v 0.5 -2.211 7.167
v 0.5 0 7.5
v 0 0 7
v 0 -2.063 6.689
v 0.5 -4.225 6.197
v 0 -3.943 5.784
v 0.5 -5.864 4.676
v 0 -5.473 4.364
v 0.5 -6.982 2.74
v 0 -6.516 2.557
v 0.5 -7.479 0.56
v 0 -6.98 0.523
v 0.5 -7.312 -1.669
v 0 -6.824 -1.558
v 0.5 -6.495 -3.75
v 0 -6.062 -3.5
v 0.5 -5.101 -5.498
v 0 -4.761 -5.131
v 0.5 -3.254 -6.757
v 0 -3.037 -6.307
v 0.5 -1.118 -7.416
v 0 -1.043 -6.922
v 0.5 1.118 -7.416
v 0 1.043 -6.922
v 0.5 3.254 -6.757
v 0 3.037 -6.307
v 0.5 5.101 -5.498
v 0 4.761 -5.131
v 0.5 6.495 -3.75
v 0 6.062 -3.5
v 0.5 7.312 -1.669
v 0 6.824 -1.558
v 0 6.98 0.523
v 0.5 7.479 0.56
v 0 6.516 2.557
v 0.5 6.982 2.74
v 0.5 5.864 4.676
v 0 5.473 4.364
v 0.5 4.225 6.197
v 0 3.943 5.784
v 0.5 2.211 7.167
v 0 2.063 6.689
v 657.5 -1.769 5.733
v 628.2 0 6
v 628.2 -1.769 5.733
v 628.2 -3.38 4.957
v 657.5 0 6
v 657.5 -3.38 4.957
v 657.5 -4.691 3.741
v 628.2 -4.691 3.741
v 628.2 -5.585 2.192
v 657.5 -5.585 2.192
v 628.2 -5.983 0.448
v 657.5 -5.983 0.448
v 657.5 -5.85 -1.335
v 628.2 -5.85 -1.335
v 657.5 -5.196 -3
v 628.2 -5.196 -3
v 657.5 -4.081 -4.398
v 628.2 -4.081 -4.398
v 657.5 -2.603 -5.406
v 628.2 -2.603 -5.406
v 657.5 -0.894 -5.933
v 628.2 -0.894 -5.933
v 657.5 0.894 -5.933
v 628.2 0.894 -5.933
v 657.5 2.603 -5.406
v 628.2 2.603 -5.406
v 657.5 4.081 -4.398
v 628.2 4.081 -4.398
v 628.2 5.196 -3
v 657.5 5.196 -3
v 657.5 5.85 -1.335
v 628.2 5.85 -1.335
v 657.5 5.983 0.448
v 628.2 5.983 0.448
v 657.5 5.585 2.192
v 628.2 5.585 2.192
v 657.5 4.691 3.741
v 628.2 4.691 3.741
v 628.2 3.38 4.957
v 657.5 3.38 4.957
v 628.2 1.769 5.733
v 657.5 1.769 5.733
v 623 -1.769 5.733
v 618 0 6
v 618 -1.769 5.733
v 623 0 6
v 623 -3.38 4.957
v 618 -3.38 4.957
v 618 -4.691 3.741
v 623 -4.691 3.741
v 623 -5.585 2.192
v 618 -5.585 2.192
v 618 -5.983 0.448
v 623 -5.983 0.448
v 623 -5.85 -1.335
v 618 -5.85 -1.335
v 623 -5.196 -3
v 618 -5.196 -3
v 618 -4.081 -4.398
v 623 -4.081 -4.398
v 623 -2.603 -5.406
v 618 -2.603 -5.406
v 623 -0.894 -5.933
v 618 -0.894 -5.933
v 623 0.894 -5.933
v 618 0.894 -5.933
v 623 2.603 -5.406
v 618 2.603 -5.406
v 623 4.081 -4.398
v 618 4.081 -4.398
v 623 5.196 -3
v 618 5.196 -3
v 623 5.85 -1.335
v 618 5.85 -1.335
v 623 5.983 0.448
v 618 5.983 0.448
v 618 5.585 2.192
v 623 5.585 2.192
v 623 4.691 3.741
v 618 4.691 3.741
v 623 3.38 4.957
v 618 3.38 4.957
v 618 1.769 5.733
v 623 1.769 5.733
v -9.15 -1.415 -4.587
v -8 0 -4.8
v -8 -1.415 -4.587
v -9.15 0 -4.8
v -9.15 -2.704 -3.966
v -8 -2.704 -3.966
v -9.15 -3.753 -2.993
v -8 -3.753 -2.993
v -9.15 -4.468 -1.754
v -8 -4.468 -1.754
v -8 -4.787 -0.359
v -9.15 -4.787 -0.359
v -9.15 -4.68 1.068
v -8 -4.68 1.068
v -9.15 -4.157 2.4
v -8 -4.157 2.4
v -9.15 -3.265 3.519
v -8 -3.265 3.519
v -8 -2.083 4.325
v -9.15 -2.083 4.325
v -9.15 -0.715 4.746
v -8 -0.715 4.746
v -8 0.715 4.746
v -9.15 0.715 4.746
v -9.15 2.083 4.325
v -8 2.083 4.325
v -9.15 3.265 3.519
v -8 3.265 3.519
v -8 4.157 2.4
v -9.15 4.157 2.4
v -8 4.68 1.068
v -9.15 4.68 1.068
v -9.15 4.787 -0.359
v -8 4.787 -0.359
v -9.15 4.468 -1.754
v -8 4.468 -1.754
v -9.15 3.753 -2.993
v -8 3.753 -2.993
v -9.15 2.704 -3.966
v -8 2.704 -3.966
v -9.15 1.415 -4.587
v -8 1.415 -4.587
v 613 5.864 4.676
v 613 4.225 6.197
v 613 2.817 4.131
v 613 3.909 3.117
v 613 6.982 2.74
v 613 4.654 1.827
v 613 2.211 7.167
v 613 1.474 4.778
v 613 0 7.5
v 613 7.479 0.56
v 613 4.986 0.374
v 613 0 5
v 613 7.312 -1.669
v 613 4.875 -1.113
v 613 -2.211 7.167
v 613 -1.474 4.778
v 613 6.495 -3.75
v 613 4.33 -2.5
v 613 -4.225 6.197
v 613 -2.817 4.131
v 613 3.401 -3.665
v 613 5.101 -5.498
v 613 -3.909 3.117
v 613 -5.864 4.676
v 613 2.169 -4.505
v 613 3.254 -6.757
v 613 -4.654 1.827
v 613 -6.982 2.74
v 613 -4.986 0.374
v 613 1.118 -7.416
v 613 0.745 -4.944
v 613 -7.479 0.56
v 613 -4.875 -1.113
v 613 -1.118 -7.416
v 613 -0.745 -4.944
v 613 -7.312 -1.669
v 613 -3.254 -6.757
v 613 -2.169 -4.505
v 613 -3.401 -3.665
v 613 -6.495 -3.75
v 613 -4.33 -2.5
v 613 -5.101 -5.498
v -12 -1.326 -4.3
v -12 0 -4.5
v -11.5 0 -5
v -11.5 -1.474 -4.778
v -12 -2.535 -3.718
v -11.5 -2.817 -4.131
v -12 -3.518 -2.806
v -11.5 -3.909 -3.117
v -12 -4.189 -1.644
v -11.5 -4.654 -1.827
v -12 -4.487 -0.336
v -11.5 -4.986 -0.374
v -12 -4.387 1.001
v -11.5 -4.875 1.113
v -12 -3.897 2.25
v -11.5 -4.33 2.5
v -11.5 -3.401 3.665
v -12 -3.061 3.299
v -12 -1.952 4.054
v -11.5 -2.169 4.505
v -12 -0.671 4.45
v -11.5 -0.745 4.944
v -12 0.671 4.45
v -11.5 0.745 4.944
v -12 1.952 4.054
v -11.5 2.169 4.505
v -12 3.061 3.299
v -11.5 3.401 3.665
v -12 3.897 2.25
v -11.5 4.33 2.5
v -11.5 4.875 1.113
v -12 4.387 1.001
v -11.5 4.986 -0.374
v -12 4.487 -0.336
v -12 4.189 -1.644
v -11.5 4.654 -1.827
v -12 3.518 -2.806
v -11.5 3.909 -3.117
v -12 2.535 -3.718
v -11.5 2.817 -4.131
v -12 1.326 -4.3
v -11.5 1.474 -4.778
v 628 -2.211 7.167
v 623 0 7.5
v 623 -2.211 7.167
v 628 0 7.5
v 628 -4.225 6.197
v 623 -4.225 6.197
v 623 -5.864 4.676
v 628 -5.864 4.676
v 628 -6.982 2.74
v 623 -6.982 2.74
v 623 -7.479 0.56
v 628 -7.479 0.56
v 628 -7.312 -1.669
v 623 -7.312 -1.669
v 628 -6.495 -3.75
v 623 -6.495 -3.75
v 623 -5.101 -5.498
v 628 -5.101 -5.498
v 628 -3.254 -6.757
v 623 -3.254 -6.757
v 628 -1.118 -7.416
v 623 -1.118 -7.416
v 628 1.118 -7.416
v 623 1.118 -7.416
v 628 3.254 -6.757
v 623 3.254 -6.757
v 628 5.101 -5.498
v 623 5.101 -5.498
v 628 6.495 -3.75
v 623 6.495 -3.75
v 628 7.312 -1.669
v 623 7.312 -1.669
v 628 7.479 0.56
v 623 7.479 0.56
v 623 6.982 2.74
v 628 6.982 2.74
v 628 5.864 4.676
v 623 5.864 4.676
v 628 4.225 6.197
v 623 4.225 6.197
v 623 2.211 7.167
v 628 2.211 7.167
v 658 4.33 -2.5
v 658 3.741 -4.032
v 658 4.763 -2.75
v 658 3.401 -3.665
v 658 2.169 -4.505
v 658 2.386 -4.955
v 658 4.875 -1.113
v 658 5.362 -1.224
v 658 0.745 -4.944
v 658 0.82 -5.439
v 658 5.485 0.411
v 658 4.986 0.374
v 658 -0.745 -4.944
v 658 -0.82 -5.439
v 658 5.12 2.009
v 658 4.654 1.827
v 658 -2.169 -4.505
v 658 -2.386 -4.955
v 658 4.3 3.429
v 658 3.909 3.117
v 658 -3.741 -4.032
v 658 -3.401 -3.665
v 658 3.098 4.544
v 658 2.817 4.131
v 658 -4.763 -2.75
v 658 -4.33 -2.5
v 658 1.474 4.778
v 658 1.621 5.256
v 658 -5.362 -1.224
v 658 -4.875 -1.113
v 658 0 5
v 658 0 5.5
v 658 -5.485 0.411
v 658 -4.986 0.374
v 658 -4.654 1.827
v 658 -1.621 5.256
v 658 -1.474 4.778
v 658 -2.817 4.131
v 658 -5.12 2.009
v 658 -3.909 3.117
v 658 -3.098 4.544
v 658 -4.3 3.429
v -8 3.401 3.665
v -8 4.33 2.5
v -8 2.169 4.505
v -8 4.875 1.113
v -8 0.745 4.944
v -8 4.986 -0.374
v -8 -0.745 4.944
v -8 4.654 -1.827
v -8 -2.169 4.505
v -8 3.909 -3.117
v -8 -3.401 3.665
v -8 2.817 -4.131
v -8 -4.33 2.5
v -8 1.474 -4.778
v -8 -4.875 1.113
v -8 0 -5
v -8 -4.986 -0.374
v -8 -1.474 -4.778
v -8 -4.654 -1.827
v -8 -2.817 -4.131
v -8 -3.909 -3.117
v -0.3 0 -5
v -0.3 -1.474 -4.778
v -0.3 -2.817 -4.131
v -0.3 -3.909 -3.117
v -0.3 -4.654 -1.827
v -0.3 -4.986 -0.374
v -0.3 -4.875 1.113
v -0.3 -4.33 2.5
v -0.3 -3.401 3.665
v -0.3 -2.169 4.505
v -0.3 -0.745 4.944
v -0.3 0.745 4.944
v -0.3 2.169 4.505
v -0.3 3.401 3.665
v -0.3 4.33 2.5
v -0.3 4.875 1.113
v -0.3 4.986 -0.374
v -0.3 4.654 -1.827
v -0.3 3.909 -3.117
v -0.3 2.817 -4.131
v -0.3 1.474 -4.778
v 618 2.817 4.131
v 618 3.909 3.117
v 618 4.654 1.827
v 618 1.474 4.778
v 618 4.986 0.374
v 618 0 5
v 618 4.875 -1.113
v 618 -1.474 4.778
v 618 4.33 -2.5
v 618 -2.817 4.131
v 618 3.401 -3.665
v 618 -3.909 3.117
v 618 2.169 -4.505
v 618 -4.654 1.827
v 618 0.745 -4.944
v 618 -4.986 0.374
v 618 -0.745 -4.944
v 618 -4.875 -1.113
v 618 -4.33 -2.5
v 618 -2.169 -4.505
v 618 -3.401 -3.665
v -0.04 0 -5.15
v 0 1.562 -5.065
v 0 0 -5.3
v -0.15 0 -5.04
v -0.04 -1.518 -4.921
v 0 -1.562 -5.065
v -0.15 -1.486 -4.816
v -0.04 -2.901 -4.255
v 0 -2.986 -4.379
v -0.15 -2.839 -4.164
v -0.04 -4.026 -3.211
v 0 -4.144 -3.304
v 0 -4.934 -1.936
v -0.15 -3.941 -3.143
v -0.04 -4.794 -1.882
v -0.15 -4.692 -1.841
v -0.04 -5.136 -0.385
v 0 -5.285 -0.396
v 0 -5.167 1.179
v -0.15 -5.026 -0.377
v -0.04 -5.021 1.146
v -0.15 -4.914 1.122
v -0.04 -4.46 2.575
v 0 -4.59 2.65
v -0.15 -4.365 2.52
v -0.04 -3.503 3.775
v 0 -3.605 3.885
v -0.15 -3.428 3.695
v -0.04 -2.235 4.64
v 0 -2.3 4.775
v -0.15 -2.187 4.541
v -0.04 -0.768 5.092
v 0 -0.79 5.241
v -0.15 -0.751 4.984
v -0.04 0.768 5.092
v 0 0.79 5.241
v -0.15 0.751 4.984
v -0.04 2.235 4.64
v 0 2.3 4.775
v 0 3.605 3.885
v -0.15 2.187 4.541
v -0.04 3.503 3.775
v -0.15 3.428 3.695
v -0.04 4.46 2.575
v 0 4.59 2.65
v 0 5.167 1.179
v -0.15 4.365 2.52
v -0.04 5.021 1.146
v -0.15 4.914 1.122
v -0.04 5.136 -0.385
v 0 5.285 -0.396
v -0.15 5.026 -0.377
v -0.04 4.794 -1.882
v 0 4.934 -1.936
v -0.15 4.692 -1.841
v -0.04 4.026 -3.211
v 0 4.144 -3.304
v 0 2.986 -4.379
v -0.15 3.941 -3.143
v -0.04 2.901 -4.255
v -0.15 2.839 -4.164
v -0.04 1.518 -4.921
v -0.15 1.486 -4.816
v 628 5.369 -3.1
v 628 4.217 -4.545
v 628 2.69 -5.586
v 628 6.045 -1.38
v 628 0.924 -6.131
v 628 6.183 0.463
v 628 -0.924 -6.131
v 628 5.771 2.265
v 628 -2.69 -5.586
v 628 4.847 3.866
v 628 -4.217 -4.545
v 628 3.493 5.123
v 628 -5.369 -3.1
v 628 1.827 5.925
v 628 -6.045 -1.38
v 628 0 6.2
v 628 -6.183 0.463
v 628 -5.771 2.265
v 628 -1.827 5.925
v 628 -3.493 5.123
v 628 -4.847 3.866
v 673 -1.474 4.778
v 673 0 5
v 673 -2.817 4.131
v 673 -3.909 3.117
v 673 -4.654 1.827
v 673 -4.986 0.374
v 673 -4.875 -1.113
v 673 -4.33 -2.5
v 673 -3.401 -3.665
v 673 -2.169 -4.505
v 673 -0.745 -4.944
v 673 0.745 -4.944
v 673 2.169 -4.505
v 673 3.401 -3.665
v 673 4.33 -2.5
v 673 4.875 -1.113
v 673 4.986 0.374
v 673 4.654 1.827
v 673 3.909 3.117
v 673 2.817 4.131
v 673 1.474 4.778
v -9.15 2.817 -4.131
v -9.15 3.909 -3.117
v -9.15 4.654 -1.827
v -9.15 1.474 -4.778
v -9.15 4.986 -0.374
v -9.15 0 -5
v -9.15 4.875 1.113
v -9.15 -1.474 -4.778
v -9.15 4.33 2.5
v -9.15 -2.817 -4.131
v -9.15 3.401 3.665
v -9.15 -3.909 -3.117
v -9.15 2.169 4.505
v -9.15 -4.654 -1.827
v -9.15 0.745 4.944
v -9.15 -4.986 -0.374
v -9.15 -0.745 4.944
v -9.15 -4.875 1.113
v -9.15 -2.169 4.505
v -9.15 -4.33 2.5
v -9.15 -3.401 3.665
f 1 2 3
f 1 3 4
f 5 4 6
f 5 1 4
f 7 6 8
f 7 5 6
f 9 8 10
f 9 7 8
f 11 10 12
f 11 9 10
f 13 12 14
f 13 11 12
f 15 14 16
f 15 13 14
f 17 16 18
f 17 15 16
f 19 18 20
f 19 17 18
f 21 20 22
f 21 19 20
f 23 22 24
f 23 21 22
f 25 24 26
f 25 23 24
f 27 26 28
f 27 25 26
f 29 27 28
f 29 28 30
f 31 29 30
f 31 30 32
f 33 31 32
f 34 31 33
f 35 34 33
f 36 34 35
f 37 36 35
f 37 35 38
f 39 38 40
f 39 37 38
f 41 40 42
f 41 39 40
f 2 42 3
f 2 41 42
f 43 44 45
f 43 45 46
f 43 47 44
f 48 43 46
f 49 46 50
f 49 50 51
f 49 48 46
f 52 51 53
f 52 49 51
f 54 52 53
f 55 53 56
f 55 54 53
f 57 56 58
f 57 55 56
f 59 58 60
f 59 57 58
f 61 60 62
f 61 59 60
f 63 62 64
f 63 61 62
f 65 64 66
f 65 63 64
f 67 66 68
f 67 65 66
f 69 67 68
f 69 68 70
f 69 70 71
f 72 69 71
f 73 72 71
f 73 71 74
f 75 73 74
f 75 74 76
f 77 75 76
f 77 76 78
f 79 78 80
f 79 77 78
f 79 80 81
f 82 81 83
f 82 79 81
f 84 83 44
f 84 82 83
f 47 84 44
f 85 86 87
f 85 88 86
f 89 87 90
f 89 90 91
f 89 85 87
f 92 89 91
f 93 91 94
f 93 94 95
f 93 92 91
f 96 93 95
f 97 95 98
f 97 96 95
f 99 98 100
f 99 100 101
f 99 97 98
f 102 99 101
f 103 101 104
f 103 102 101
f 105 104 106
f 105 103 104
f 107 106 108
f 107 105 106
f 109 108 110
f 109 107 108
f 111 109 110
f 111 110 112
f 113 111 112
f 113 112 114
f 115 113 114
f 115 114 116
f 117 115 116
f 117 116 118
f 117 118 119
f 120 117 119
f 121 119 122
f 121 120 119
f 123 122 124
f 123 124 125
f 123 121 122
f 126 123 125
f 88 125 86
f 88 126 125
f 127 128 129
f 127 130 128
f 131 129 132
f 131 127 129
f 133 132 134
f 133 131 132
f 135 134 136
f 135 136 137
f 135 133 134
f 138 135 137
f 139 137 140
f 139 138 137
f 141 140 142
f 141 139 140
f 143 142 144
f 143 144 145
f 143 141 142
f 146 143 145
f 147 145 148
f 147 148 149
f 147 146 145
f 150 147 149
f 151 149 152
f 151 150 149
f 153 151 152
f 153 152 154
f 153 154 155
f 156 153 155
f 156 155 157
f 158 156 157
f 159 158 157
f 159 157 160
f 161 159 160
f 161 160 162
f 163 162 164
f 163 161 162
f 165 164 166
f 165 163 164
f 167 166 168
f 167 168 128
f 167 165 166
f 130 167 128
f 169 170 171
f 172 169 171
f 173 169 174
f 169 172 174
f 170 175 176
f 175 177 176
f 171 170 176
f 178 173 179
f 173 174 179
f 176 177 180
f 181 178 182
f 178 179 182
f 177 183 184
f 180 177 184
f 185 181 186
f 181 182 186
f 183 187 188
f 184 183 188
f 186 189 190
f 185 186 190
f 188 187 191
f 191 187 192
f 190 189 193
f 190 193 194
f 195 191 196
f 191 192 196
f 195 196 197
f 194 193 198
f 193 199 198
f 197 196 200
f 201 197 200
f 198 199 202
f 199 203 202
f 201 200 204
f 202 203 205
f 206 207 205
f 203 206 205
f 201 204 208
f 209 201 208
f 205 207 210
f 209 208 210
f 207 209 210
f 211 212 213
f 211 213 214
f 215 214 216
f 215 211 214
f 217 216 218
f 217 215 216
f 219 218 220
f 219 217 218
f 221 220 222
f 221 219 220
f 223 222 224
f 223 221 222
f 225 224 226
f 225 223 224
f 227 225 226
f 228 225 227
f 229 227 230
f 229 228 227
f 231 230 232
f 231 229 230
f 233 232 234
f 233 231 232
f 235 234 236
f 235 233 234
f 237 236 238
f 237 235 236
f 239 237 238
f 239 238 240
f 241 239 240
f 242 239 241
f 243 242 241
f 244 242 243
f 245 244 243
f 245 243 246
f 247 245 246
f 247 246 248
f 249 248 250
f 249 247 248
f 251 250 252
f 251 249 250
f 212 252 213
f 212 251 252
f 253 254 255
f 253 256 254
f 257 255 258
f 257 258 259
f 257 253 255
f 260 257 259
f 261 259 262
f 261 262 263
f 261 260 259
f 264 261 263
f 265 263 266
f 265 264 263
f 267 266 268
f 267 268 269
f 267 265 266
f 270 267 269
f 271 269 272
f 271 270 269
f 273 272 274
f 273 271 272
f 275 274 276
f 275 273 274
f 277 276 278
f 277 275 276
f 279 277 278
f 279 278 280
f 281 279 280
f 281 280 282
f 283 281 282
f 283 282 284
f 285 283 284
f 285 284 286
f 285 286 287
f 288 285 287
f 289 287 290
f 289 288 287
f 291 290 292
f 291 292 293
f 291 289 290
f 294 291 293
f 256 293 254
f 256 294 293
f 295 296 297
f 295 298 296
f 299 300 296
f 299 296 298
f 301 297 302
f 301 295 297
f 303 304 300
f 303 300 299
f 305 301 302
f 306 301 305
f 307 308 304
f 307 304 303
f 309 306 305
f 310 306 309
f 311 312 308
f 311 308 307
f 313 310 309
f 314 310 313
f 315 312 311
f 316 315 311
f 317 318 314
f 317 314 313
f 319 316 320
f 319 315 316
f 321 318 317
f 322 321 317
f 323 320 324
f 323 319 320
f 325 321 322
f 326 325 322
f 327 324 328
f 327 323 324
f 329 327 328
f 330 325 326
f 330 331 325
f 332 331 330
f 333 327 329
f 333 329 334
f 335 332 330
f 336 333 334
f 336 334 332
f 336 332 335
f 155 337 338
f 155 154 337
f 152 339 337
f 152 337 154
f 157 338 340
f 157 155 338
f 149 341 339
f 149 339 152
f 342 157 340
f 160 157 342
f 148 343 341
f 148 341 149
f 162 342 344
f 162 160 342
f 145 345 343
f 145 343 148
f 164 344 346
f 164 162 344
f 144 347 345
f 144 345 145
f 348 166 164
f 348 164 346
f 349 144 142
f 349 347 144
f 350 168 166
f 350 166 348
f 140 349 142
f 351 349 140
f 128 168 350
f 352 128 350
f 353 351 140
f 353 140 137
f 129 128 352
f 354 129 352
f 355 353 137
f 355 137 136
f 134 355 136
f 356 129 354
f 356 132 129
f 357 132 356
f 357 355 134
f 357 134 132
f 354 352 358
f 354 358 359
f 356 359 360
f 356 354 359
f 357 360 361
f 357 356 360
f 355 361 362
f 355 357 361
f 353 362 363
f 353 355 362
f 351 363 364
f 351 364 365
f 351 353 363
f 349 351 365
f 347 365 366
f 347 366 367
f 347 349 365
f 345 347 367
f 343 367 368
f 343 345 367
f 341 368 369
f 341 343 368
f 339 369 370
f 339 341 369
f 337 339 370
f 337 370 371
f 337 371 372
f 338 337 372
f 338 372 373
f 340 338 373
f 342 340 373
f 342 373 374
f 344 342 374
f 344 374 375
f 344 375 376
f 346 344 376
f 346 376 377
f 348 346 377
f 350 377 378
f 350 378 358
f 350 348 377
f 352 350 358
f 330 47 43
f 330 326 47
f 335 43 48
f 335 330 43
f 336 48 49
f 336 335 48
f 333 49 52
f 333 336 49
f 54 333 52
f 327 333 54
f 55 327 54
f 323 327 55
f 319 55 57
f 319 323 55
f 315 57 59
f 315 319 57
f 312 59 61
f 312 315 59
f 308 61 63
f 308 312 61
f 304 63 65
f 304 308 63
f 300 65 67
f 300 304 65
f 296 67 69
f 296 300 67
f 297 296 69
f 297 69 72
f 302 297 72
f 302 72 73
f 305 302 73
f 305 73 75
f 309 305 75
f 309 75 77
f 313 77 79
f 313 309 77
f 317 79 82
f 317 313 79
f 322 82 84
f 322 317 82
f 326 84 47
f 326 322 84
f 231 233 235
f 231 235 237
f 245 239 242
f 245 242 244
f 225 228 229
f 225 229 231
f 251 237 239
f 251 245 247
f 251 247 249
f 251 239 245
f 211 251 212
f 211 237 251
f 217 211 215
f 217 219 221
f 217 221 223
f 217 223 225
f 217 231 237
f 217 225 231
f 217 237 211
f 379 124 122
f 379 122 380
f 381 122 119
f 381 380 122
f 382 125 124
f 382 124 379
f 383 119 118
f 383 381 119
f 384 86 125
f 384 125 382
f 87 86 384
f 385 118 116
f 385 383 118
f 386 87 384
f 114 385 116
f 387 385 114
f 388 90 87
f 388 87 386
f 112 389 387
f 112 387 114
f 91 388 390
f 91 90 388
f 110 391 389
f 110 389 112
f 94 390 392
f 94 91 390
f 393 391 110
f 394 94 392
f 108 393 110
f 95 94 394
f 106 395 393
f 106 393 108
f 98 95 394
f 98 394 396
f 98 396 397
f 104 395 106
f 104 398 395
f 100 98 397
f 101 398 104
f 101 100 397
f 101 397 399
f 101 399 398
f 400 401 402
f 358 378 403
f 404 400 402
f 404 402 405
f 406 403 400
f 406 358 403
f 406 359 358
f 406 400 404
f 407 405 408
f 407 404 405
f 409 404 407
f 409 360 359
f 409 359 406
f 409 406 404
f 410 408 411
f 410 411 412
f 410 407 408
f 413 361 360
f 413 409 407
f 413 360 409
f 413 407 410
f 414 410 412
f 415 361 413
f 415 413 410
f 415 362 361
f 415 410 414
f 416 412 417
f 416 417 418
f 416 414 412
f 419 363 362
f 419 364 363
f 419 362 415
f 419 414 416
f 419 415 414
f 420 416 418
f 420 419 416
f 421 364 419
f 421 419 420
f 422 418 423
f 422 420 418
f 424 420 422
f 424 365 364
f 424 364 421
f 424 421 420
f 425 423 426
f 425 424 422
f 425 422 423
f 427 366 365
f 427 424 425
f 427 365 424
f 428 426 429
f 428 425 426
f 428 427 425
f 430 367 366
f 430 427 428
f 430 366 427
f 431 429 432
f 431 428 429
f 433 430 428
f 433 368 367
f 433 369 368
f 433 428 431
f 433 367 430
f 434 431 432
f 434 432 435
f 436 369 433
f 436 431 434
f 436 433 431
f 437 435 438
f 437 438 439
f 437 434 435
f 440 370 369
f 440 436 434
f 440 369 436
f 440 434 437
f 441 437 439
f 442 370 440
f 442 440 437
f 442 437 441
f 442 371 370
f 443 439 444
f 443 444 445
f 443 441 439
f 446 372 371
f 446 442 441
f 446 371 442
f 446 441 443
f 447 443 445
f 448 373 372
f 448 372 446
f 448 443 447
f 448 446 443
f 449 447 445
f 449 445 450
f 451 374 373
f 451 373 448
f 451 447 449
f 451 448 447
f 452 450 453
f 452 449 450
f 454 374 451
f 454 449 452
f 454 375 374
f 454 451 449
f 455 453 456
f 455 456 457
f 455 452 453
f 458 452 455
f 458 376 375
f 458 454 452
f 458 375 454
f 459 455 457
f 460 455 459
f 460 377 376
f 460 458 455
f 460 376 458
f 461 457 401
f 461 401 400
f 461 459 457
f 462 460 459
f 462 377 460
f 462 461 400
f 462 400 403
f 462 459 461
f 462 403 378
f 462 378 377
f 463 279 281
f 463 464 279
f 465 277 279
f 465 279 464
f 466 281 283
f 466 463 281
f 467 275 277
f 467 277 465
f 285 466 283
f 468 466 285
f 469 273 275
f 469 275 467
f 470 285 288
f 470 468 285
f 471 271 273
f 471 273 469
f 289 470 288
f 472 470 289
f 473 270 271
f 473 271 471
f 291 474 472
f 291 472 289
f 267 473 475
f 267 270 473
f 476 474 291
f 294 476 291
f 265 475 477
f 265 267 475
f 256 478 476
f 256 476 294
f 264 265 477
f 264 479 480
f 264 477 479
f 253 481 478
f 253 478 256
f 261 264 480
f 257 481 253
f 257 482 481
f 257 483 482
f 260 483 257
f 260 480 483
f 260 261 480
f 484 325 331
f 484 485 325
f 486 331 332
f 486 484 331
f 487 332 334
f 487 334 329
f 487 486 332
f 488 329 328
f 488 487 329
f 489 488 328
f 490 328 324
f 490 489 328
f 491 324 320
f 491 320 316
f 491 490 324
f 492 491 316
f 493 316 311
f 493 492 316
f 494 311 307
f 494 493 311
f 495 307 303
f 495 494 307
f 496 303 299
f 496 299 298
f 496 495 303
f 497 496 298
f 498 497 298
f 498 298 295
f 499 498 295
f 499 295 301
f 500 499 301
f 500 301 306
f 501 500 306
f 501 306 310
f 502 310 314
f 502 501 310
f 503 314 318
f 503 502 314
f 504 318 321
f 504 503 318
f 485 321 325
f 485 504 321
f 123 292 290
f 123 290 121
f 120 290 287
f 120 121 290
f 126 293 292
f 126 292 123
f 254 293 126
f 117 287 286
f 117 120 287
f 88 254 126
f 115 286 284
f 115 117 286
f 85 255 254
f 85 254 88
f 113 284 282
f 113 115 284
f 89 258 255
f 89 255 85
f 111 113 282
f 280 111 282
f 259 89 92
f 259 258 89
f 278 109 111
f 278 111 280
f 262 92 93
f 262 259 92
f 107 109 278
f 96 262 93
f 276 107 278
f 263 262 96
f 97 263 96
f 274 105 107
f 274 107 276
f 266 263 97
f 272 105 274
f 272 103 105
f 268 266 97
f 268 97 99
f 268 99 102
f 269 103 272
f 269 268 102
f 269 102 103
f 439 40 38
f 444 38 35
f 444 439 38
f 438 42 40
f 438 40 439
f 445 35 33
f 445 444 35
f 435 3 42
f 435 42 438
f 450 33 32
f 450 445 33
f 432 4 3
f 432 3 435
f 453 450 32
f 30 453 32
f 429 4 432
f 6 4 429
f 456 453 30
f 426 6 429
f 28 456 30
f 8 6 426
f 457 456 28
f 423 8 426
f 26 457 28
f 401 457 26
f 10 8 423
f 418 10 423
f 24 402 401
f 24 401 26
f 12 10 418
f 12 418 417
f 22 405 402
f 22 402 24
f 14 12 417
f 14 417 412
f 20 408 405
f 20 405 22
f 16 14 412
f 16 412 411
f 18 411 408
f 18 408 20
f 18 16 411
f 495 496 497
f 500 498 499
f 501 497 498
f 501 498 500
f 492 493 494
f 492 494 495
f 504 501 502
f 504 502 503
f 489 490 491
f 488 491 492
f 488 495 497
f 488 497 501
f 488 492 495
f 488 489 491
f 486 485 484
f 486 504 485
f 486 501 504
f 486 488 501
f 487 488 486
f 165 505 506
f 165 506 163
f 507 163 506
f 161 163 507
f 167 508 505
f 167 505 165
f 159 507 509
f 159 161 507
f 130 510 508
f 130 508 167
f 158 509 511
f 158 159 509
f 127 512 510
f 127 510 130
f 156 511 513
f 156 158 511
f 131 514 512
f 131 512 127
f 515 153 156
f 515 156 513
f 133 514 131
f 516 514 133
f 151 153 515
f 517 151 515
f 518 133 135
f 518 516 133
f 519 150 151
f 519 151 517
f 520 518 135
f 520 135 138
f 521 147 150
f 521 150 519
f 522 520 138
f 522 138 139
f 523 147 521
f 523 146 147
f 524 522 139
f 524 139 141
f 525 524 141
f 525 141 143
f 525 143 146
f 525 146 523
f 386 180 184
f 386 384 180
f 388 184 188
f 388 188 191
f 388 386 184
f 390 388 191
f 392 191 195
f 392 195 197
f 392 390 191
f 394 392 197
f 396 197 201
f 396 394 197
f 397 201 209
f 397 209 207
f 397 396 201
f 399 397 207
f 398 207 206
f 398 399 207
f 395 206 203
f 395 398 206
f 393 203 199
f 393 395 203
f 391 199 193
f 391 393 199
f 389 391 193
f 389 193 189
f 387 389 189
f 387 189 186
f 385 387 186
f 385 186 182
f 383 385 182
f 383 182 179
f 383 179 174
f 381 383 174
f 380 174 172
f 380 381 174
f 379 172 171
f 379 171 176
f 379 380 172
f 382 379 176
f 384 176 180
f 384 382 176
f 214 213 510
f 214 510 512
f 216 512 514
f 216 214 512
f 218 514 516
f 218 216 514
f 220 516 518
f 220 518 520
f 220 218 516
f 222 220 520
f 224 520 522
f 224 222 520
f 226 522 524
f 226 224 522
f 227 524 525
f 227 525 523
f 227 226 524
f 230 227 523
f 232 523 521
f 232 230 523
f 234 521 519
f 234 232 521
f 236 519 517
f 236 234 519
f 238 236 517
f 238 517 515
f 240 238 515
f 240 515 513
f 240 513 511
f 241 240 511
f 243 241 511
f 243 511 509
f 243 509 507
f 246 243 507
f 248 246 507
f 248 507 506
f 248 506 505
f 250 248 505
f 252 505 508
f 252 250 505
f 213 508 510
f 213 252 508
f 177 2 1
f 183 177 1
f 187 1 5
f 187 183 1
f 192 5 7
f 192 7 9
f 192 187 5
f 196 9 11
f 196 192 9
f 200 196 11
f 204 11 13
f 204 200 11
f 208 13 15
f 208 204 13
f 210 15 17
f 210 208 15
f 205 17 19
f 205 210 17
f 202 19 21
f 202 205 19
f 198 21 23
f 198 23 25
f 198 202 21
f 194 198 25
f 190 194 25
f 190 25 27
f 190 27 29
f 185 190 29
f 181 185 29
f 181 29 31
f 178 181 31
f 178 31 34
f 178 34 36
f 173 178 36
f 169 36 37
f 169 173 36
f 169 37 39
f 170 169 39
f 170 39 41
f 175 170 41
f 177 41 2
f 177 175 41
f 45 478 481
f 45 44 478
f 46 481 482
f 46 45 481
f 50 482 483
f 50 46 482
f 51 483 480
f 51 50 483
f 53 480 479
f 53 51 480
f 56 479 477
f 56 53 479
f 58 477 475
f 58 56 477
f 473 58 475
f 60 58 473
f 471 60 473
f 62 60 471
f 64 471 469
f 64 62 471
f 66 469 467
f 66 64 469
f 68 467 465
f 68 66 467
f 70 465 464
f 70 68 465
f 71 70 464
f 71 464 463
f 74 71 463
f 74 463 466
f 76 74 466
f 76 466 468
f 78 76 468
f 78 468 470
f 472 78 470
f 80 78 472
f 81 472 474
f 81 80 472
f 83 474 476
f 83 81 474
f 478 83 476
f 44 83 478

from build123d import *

# Parameters (mm, degrees)
SKETCH_1_W     = 613
SKETCH_1_H     = 7.5
FILLET_1_R     = 0.3
CHAMFER_1_SIZE = 0.5


with BuildPart() as part:
    # 스케치1 → 회전1 (revolve)
    with BuildSketch(Plane.XY, mode=Mode.PRIVATE) as revolve_1_sk:
        with Locations((306.5, 3.75)):
            Rectangle(SKETCH_1_W, SKETCH_1_H)
    revolve(revolve_1_sk.sketch.rotate(Axis((0, 0, 0), (1, 0, 0)), 90), axis=Axis((0, 0, 0), (1, 0, 0)))

    # 스케치2 → 회전3 (revolve)
    with BuildSketch(Plane.XY, mode=Mode.PRIVATE) as revolve_3_sk:
        Polygon((613, 5), (618, 5), (618, 6), (623, 6), (623, 7.5), (628, 7.5), (628, 6.2), (628.2, 6), (657.5, 6), (658, 5.5), (658, 5), (673, 5), (673, 0), (613, 0), align=None)
    revolve(revolve_3_sk.sketch.rotate(Axis((613, 0, 0), (1, 0, 0)), 90), axis=Axis((613, 0, 0), (1, 0, 0)))

    # 스케치3 → 회전4 (revolve)
    with BuildSketch(Plane.XY, mode=Mode.PRIVATE) as revolve_4_sk:
        Polygon((0, 5), (-8, 5), (-8, 4.8), (-9.15, 4.8), (-9.15, 5), (-12, 5), (-12, 0), (0, 0), align=None)
    revolve(revolve_4_sk.sketch.rotate(Axis((0, 0, 0), (-1, 0, 0)), 90), axis=Axis((0, 0, 0), (-1, 0, 0)))

    # 필렛1
    fillet_1_edges = [part.edges().sort_by_distance(p)[0] for p in [
        (0, 0, 5),
    ]]
    fillet(fillet_1_edges, radius=FILLET_1_R)

    # 모따기1
    chamfer_1_edges = [part.edges().sort_by_distance(p)[0] for p in [
        (-12, 0, 5),
        (0, 0, -7.5),
    ]]
    chamfer(chamfer_1_edges, length=CHAMFER_1_SIZE)


solid = part.part
